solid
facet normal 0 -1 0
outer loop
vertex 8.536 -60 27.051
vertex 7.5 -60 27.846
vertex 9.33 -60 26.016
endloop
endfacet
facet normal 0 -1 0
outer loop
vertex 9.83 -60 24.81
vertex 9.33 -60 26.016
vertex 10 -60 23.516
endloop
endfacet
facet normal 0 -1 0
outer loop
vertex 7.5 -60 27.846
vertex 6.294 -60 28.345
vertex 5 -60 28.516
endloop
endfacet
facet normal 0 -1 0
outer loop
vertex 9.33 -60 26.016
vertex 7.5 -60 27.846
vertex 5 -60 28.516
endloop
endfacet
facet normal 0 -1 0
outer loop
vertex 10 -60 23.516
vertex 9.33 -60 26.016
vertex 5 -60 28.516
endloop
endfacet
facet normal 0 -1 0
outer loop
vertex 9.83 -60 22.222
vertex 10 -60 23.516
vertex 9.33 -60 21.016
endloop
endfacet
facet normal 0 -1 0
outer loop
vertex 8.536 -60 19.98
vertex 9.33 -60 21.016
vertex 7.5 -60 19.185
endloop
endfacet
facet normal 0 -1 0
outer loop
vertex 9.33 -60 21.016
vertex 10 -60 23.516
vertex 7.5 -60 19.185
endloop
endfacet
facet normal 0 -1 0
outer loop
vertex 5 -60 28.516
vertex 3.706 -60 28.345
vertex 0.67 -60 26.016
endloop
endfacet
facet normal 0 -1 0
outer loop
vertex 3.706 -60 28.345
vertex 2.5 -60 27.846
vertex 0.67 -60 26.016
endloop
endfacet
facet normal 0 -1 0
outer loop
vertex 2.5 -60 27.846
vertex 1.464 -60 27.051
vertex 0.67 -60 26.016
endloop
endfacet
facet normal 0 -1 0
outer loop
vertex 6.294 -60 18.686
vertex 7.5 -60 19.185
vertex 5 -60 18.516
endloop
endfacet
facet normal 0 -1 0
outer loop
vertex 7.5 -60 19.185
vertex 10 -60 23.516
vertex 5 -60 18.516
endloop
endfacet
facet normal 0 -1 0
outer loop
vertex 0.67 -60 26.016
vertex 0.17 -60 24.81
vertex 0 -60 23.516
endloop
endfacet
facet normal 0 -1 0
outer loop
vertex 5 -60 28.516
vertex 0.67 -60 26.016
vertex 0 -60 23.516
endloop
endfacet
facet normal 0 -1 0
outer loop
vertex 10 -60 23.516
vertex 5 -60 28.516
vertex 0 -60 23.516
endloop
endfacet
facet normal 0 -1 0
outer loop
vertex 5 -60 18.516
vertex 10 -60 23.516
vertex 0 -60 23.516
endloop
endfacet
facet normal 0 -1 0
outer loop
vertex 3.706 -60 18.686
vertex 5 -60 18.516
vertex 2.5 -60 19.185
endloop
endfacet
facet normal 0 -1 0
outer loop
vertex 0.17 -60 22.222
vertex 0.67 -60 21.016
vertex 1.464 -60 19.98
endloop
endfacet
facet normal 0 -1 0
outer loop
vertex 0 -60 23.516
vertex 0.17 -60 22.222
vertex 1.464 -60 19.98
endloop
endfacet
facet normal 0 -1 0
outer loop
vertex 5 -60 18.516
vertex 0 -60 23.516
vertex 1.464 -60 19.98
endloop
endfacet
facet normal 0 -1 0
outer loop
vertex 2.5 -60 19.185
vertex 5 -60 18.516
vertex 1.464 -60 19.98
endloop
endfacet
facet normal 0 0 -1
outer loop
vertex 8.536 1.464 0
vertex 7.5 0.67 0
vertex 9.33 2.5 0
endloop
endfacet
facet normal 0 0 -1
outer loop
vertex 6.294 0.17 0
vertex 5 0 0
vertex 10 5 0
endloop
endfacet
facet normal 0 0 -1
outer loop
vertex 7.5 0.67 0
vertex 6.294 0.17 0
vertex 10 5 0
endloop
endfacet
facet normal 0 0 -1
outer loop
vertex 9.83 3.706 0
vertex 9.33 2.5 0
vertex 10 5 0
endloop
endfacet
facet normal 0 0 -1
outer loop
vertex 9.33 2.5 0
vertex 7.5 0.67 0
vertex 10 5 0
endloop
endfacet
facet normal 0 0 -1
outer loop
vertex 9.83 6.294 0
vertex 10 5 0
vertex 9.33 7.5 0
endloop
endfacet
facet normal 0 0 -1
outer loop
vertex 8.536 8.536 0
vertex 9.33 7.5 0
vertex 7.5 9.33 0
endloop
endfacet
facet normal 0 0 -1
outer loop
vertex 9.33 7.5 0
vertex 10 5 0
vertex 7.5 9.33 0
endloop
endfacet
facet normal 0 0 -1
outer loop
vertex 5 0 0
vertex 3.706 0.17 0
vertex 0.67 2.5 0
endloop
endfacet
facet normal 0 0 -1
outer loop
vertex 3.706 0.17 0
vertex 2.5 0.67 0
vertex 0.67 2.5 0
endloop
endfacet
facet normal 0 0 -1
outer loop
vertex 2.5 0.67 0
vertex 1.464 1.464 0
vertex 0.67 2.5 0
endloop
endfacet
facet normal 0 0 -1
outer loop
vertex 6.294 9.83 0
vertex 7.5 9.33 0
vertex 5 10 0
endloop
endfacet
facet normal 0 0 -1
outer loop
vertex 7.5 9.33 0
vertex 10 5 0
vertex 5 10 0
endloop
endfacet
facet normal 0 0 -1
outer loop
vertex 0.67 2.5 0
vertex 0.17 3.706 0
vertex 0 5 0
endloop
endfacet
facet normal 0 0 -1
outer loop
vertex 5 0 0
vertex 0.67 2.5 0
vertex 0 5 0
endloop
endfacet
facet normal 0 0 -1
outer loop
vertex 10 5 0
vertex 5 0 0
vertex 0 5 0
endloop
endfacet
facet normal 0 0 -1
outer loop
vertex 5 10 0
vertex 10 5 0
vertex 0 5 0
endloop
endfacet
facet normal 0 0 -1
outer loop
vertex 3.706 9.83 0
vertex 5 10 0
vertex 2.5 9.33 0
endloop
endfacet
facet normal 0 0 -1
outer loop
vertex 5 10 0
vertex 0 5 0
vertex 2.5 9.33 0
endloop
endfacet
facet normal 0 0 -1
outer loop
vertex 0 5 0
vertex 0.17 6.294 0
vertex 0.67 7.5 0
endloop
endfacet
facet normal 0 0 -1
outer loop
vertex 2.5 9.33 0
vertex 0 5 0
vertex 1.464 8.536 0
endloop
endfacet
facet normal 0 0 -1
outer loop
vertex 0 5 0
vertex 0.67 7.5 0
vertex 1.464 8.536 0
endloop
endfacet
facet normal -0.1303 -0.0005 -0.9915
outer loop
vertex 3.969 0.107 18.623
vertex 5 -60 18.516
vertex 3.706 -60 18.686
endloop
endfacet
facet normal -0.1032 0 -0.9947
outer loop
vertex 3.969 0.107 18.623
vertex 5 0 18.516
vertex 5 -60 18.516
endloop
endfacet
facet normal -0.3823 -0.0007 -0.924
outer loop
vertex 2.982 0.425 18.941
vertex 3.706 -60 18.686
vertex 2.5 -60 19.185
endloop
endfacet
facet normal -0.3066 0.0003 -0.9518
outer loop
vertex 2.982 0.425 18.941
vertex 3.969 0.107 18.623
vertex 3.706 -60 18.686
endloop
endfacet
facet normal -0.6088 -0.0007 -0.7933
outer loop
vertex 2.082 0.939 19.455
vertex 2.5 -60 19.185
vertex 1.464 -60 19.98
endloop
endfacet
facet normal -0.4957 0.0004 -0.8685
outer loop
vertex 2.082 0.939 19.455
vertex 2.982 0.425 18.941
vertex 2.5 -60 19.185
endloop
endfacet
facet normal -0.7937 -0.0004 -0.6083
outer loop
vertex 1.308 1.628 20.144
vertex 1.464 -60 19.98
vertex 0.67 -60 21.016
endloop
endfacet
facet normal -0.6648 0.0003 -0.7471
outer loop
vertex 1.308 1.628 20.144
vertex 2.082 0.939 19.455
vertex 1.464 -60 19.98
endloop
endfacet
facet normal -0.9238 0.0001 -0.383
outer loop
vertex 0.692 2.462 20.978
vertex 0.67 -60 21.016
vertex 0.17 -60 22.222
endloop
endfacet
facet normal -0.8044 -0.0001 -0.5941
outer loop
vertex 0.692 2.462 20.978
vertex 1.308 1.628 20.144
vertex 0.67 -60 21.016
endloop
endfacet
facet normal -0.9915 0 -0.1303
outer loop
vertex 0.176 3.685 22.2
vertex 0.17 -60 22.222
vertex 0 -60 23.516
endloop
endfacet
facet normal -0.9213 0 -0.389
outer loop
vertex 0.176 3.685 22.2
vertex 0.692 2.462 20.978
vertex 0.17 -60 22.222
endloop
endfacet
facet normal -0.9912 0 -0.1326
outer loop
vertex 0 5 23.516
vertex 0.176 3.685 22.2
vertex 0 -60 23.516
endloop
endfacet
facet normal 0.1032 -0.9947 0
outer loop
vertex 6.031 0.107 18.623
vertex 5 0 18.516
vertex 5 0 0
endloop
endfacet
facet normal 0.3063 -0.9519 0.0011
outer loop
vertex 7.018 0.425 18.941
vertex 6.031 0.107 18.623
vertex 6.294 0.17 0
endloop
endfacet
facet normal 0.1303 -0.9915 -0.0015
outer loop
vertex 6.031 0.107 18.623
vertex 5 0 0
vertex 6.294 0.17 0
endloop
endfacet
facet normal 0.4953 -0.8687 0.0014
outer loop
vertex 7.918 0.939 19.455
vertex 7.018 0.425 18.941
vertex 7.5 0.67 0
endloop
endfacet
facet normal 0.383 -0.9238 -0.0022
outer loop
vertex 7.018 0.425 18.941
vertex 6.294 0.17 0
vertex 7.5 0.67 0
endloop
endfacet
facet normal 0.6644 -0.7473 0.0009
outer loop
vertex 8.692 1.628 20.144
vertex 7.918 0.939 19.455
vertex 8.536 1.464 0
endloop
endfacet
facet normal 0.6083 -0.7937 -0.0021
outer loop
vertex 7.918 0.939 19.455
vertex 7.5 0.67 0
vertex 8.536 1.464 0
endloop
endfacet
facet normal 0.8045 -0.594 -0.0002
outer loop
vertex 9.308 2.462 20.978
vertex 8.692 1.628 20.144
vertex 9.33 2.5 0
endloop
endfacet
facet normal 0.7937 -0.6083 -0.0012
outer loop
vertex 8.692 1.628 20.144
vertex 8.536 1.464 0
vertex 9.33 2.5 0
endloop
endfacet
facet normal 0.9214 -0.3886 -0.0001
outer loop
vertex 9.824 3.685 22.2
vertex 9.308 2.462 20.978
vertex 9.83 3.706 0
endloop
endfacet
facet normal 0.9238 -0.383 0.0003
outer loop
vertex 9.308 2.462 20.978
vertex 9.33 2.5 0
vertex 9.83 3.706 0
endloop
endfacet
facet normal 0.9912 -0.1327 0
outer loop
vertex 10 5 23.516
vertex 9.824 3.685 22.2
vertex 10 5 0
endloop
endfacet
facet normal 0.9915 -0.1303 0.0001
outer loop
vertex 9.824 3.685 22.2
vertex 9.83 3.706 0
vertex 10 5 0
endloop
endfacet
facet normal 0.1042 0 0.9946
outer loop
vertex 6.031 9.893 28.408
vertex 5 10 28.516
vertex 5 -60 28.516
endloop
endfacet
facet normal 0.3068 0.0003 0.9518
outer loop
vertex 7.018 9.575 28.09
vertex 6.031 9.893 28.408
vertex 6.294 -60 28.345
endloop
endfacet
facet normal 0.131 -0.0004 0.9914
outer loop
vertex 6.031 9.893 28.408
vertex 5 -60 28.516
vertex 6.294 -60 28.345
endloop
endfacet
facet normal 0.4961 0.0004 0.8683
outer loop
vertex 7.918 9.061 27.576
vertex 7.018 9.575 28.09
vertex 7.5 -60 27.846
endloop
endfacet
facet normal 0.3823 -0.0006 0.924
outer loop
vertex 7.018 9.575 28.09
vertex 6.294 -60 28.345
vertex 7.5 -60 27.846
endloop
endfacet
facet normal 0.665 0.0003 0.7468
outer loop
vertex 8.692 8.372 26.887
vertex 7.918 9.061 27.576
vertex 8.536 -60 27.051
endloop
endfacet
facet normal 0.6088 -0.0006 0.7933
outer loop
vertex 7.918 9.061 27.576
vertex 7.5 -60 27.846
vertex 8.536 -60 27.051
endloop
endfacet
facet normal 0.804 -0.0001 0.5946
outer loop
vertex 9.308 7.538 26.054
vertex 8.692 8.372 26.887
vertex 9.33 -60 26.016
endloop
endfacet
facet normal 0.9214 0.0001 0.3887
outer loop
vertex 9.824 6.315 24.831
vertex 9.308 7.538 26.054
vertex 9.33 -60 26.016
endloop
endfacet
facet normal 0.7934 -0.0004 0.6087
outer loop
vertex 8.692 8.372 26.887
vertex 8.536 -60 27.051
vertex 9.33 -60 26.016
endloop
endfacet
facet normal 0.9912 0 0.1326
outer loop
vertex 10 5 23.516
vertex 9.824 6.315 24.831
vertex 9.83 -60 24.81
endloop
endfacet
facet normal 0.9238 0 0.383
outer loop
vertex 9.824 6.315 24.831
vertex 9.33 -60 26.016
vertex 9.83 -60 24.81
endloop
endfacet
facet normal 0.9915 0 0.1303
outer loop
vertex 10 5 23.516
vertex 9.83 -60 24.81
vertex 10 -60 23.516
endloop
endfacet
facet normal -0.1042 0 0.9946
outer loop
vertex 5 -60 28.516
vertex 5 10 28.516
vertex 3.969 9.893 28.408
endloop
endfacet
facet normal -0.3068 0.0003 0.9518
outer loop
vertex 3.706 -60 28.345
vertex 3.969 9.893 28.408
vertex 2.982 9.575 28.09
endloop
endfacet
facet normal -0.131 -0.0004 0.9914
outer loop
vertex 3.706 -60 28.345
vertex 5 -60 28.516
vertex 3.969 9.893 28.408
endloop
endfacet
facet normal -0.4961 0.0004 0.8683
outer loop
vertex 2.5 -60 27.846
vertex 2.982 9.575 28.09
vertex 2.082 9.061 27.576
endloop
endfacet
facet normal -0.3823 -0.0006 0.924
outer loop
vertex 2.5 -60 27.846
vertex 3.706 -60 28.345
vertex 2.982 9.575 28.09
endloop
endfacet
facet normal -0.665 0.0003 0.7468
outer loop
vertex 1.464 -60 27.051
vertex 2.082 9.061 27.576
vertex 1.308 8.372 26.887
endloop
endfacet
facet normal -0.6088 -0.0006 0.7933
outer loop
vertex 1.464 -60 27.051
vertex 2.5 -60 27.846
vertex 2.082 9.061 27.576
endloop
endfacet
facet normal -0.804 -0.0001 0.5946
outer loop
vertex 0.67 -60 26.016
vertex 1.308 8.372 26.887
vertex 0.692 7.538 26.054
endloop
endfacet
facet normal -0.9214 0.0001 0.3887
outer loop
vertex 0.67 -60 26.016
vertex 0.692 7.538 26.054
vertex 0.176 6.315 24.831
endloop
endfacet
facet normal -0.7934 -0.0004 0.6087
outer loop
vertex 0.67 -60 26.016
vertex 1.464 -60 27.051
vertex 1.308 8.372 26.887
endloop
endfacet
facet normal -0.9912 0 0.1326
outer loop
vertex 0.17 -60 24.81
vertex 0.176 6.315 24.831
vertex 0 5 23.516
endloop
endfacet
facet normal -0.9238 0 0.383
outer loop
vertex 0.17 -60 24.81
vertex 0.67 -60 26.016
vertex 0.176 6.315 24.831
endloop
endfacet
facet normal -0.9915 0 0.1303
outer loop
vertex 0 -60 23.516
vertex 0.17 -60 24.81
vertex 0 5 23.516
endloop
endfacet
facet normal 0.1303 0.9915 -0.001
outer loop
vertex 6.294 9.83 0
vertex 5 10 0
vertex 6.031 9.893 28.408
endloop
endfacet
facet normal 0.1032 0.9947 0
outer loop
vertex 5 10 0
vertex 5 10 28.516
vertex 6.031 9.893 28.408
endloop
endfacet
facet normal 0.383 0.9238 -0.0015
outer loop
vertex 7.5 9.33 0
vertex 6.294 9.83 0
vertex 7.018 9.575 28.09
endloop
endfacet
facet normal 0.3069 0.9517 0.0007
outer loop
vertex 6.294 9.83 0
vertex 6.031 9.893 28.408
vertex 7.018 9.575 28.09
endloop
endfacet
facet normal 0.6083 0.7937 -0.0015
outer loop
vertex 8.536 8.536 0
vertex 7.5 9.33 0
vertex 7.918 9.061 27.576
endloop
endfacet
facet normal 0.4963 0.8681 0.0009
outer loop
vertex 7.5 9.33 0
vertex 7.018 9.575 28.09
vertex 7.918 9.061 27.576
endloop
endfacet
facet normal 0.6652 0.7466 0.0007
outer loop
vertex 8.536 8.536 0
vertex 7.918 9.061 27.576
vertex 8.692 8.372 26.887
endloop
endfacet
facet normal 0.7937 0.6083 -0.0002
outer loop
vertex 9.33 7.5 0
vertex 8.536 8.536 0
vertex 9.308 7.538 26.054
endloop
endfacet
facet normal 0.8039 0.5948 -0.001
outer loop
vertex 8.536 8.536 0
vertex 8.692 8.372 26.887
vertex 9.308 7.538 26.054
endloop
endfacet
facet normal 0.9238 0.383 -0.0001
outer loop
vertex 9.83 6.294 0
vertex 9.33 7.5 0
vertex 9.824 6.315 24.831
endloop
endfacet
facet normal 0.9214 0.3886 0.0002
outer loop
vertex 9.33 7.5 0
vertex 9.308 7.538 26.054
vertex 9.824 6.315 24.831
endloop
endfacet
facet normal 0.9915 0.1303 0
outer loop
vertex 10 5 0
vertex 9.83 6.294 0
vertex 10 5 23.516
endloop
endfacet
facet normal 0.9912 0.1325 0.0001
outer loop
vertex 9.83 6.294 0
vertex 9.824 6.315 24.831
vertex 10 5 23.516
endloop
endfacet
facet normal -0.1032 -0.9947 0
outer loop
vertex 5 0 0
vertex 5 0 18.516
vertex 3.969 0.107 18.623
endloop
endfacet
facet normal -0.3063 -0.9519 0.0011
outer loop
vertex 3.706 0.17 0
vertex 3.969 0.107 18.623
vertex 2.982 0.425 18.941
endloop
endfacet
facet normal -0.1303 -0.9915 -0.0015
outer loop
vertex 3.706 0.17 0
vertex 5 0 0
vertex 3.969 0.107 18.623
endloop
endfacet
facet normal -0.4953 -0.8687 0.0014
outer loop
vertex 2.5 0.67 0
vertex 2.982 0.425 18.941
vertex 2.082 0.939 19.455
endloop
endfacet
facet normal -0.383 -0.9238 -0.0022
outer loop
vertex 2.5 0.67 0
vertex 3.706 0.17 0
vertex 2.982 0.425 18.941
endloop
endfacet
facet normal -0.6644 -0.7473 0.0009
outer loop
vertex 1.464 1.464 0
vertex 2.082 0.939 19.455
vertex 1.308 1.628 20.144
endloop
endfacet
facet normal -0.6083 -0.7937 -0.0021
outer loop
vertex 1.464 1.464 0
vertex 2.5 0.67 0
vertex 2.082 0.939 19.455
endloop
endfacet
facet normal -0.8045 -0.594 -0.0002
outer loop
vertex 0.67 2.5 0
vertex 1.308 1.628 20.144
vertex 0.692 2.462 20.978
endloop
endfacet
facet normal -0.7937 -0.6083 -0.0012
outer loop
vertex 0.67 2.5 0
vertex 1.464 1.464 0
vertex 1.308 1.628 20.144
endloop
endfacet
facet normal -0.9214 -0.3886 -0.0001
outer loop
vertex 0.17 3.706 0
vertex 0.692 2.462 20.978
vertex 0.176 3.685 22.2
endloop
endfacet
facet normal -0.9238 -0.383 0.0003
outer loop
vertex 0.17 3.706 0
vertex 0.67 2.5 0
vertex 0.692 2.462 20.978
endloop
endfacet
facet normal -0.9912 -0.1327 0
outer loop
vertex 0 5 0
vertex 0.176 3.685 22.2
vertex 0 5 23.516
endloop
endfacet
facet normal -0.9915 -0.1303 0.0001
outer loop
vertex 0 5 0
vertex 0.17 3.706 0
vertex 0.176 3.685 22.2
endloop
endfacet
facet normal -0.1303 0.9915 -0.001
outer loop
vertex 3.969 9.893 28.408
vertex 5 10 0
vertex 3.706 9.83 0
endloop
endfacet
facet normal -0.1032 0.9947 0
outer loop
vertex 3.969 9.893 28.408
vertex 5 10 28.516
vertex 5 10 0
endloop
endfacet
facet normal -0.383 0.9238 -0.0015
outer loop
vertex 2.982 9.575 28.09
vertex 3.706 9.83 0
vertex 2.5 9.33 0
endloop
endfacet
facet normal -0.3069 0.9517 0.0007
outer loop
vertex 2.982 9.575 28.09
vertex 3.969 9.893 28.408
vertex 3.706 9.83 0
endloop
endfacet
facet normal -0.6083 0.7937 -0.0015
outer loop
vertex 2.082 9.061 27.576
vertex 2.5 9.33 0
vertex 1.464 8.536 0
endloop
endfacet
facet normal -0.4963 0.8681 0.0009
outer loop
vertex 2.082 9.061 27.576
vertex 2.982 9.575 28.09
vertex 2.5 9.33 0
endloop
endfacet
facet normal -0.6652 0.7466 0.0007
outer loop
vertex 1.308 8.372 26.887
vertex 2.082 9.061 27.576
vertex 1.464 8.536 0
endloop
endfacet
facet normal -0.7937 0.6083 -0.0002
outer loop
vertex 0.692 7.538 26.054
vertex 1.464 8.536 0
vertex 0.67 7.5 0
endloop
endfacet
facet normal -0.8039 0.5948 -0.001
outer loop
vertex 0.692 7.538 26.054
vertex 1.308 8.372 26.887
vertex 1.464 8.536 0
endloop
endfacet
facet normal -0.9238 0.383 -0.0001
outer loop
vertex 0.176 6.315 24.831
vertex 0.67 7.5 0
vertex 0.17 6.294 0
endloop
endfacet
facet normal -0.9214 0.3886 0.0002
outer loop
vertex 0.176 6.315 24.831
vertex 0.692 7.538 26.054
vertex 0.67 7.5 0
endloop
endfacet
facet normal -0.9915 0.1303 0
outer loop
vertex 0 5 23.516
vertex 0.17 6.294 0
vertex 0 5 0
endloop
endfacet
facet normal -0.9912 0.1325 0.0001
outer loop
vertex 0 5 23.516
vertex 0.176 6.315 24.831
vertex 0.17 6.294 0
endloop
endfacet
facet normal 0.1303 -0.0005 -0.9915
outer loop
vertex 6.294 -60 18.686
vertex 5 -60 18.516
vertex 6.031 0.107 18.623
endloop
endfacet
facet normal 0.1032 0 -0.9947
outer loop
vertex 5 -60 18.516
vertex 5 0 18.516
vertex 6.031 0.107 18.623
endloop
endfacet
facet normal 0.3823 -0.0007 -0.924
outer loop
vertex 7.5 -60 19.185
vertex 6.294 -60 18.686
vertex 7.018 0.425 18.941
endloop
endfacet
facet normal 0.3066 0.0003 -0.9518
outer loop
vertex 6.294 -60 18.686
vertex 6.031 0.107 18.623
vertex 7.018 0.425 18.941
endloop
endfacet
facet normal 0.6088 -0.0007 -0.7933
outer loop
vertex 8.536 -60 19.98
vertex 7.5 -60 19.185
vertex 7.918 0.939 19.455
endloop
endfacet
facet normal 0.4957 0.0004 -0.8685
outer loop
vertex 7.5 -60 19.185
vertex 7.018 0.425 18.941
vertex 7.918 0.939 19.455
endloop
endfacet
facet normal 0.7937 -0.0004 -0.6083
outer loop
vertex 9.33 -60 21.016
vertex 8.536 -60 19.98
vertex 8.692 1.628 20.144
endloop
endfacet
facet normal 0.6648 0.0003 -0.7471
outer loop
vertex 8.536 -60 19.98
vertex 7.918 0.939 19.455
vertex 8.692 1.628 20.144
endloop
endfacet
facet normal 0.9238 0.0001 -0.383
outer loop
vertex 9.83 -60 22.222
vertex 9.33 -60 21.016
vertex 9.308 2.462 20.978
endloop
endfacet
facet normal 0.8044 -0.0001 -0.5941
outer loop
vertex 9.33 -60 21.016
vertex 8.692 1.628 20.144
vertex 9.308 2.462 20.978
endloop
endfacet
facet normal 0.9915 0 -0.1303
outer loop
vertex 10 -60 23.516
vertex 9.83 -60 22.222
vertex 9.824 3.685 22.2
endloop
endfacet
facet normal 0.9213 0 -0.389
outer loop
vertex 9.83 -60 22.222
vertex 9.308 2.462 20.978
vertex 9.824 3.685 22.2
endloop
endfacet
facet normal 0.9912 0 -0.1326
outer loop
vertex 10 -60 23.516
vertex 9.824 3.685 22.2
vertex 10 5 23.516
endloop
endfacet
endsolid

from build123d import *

# Parameters (mm, degrees)
F1_DEPTH = 10
F2_R     = 4.99999


# Not quite as in the source:
# - a fillet or chamfer is up to 0.001 mm smaller than in the source, because OpenCascade refuses the exact size


with BuildPart() as f1:
    # F0 (on Right) → F1 (new body)
    with BuildSketch(Plane.YZ):
        Polygon((0, 18.5156259346), (0, 0), (10, 0), (10, 28.5156259346), (-60, 28.5156259346), (-60, 18.5156259346), align=None)
    extrude(amount=F1_DEPTH)

    # F2 (radius 5 in the source; OpenCascade refuses exactly that, so slightly less here)
    f2_edges = [f1.edges().sort_by_distance(p)[0] for p in [
        (10, -30, 18.515626),
        (0, -30, 18.515626),
        (10, -25, 28.515626),
        (0, -25, 28.515626),
        (10, 0, 9.257813),
        (0, 0, 9.257813),
        (0, 10, 14.257813),
        (10, 10, 14.257813),
    ]]
    fillet(f2_edges, radius=F2_R)


solid = f1.part
